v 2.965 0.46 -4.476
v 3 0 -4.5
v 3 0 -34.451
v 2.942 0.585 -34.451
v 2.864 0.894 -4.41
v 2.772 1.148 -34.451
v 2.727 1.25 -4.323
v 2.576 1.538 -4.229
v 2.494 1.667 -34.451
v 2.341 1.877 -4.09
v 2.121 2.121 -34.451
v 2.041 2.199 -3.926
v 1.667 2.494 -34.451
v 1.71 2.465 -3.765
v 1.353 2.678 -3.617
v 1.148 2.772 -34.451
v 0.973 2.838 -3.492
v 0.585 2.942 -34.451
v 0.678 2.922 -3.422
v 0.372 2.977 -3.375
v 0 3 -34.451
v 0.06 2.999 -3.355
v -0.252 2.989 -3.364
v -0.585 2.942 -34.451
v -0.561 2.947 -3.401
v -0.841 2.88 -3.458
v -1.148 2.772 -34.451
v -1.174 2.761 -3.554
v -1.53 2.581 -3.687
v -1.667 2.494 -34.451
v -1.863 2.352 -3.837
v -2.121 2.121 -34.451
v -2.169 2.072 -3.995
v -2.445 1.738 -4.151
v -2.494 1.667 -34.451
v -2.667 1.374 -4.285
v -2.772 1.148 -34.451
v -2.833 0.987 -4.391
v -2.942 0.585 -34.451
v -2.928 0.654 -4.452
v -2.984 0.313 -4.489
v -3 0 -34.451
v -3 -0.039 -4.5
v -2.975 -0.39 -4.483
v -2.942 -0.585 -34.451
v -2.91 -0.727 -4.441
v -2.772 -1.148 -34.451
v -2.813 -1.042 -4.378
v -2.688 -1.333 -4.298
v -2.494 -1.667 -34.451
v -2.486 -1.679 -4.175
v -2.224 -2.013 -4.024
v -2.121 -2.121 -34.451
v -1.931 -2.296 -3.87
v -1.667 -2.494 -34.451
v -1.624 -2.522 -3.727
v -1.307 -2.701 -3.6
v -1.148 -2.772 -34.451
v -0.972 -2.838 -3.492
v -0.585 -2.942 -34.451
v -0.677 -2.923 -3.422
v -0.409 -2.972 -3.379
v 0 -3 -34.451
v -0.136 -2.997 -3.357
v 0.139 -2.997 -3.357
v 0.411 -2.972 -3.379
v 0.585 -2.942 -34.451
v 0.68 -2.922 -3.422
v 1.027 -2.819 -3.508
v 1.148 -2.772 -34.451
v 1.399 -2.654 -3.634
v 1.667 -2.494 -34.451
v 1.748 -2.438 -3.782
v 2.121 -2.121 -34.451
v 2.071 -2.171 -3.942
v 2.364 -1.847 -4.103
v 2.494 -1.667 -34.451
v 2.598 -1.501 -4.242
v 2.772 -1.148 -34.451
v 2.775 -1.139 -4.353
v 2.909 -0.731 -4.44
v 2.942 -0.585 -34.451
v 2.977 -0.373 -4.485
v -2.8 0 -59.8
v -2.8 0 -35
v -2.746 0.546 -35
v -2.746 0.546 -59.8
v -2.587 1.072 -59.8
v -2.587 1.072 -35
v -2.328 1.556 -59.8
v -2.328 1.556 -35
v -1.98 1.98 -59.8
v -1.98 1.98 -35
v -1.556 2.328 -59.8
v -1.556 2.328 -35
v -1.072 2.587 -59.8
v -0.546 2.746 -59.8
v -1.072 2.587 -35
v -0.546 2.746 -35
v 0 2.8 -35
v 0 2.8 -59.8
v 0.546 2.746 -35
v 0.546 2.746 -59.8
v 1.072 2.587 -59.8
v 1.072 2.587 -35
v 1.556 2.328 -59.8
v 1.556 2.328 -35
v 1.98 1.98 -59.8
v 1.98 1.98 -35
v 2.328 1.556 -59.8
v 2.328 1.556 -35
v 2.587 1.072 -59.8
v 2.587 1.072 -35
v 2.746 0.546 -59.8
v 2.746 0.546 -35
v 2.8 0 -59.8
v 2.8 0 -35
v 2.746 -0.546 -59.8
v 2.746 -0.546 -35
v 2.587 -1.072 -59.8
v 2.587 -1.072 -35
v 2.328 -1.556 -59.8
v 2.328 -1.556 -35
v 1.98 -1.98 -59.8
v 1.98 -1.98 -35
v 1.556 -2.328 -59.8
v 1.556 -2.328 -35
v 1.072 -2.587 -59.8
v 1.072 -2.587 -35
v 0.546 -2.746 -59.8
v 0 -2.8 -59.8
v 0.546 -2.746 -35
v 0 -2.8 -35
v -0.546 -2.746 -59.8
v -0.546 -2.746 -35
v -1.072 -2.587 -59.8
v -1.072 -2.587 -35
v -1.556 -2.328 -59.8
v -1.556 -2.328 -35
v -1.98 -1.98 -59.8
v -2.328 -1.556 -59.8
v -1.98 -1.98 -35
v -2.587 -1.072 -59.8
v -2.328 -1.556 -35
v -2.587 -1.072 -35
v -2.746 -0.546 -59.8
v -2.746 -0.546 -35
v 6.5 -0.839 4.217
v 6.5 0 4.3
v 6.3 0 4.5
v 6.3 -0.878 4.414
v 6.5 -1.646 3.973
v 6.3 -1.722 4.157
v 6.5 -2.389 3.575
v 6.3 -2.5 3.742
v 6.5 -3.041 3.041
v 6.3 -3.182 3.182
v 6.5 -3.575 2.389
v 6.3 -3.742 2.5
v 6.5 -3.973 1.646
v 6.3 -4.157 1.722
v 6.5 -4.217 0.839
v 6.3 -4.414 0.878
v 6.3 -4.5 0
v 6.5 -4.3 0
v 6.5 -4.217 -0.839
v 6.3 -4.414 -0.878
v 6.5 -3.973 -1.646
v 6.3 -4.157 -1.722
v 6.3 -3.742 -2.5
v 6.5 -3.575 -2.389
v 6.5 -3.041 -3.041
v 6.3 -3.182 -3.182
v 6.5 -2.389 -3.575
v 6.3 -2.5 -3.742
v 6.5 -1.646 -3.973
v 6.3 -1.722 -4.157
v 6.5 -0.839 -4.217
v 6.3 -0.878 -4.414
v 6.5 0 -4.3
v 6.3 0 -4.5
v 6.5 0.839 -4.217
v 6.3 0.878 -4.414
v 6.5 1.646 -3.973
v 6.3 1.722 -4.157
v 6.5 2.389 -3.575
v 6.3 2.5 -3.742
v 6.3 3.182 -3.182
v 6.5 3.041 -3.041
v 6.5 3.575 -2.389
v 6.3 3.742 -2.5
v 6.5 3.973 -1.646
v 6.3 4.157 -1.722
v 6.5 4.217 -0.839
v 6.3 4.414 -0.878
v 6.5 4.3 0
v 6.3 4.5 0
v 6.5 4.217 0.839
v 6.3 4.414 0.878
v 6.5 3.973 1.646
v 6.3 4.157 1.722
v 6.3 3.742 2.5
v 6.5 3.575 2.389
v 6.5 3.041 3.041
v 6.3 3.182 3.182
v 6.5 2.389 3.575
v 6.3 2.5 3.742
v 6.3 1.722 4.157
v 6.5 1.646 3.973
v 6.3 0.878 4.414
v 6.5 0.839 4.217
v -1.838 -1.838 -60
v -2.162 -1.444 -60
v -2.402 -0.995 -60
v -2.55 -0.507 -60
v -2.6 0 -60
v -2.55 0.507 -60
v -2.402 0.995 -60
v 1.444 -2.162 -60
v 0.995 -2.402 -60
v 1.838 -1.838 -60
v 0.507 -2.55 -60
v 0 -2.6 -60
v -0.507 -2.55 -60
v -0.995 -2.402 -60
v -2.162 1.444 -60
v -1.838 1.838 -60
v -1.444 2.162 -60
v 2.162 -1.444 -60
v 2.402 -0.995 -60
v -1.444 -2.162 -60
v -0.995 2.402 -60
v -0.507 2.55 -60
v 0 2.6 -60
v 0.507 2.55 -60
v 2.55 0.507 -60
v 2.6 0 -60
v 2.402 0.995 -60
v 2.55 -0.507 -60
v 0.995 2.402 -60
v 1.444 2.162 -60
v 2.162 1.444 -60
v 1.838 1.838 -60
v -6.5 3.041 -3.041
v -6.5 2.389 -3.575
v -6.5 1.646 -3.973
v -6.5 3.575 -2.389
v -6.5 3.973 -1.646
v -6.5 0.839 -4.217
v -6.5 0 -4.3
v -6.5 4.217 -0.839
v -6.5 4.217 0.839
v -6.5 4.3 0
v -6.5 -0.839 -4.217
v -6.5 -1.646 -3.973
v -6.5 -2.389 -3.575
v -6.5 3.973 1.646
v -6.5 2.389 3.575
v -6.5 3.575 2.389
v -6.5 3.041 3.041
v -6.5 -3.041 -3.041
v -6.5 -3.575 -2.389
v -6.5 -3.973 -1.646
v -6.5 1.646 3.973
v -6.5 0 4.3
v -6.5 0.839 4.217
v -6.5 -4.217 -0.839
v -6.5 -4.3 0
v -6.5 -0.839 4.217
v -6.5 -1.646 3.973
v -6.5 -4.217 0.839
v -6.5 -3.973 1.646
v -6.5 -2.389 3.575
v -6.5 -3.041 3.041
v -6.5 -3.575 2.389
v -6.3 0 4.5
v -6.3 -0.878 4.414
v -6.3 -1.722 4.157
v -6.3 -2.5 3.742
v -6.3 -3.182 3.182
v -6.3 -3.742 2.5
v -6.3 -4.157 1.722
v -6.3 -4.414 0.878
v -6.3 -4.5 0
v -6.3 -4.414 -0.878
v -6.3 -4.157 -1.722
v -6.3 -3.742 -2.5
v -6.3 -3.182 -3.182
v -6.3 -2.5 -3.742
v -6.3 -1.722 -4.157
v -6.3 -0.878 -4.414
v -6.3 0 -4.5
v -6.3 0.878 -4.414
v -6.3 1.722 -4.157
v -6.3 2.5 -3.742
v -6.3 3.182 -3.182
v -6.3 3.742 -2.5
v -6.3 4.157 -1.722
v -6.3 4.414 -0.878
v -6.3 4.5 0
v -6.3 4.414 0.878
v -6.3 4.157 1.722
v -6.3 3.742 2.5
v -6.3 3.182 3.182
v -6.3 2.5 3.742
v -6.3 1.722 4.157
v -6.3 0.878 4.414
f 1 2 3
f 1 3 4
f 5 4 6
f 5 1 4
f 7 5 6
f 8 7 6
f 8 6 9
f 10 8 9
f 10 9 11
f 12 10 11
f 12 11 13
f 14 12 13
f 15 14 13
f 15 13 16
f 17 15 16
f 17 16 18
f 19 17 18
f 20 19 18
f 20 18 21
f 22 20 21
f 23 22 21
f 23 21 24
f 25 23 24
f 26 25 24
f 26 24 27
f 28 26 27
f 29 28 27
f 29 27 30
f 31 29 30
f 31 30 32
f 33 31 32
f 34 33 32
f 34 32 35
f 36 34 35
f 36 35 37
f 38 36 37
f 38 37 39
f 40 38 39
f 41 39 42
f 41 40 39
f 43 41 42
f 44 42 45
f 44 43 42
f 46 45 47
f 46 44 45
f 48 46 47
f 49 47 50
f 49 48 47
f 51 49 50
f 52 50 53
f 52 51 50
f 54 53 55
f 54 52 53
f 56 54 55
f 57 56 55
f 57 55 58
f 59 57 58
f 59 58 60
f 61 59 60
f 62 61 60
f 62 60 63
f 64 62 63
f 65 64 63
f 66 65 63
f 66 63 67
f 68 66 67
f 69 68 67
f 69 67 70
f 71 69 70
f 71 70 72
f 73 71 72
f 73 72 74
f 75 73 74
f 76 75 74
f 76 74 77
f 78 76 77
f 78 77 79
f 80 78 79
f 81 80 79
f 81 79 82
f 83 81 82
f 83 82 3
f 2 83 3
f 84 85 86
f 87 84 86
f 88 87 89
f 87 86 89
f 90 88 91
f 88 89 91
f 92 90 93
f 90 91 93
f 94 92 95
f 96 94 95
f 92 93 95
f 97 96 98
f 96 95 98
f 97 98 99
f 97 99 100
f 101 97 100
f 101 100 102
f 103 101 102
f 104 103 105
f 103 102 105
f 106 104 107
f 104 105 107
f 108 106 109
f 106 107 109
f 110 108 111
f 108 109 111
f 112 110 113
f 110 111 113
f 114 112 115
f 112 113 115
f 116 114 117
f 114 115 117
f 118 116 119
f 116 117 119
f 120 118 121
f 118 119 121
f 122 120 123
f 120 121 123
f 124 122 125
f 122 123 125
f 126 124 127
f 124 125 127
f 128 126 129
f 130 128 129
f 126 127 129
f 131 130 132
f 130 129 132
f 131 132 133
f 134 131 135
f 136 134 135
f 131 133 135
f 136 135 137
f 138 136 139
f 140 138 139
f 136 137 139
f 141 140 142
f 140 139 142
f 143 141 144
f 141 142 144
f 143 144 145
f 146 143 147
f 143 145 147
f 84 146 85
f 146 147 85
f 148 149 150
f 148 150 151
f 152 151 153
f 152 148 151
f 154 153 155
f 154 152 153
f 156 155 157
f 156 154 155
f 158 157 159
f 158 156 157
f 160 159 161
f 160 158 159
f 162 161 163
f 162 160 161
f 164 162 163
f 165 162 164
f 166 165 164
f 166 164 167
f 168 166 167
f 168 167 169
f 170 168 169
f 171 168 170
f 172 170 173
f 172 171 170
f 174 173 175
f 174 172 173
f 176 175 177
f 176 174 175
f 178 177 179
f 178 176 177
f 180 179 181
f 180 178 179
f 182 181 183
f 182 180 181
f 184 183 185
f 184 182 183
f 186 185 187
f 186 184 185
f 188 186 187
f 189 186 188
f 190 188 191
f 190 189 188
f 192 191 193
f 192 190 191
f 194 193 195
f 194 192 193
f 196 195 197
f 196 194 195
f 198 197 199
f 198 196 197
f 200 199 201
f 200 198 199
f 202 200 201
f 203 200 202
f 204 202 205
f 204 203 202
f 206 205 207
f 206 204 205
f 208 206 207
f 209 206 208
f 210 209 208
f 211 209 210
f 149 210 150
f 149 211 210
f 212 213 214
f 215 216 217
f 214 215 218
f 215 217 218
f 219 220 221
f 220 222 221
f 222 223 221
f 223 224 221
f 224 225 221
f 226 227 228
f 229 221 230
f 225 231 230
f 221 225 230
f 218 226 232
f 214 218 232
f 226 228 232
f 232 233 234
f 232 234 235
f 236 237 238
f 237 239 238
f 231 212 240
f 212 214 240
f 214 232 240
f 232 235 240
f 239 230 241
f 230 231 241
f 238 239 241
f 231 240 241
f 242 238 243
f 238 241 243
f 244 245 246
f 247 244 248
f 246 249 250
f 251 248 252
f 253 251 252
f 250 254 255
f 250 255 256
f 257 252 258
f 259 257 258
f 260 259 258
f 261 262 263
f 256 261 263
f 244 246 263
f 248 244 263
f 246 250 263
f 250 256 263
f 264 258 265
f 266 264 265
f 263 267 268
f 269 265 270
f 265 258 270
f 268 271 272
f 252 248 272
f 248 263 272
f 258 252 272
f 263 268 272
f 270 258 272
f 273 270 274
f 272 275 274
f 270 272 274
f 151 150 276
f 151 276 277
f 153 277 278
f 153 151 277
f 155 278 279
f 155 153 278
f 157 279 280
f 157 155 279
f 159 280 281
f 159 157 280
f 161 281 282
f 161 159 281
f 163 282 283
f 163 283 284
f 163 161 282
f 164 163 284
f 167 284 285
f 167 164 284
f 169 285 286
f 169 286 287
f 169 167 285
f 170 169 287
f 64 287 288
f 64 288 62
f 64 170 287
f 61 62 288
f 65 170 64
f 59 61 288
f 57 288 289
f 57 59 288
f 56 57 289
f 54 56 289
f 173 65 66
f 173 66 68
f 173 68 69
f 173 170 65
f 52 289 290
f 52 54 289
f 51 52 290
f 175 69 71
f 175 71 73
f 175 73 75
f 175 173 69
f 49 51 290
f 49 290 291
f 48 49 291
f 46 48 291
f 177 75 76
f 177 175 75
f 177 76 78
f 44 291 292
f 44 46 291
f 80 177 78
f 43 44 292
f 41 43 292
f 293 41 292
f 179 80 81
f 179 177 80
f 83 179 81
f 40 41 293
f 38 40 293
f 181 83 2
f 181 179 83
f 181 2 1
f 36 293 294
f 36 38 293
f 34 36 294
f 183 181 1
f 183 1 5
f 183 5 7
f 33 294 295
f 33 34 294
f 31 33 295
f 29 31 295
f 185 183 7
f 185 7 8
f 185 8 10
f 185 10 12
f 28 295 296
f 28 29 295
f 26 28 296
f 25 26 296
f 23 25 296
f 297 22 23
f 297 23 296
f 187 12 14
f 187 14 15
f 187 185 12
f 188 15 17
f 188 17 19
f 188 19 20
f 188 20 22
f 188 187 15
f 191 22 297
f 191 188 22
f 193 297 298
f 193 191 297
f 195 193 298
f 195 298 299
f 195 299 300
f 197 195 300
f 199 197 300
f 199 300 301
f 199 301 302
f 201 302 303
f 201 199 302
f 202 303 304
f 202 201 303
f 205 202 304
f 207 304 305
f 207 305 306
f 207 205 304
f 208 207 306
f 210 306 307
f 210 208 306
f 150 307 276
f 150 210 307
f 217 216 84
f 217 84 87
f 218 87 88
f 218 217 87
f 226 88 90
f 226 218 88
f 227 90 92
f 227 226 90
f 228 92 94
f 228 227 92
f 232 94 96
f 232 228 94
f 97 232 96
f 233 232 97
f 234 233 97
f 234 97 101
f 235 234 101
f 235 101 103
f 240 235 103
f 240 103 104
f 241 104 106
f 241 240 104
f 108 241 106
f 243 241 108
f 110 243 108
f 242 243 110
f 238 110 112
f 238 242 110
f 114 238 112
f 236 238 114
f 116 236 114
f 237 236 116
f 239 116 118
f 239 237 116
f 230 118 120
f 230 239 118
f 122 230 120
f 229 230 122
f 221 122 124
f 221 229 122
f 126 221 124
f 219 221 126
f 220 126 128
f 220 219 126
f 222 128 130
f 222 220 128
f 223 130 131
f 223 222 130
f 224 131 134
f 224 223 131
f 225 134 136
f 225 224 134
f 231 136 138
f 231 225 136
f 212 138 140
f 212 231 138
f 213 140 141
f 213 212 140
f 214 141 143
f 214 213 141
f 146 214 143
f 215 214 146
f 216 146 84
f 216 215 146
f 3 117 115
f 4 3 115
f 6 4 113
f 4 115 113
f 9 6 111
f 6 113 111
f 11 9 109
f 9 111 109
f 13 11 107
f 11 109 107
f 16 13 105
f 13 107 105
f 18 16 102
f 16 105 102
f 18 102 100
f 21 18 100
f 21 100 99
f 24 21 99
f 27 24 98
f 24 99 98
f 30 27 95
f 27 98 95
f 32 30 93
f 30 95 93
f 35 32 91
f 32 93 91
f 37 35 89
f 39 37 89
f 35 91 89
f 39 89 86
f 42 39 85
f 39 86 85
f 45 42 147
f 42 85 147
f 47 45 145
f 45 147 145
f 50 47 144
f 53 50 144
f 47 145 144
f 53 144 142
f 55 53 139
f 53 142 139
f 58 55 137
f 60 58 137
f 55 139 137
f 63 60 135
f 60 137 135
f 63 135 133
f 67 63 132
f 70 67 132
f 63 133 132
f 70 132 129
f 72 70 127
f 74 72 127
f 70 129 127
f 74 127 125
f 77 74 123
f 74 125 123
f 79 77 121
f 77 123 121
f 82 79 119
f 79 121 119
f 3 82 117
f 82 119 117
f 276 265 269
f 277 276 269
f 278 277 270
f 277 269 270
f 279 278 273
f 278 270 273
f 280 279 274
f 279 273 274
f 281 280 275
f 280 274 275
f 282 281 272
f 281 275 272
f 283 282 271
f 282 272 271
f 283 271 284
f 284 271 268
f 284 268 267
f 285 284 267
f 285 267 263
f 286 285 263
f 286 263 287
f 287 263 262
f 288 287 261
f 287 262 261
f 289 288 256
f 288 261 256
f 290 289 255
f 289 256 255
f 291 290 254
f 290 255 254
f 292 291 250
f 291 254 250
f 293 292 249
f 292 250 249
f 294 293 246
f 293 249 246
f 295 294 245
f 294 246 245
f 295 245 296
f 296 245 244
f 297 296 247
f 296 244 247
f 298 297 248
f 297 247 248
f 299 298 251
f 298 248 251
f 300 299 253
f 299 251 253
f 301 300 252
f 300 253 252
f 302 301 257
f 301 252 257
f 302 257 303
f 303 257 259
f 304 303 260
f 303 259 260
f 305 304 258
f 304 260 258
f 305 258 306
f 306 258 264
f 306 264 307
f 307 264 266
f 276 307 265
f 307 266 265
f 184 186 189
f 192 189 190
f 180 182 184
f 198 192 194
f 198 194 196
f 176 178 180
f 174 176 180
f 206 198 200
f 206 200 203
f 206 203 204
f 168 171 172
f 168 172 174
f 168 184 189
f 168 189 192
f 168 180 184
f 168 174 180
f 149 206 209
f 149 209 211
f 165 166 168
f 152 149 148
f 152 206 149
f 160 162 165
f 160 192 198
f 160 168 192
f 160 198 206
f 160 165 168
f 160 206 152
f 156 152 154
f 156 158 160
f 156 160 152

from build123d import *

# Parameters (mm, degrees)
SKETCH1_R               = 4.5
BOSS_EXTRUDE1_DEPTH     = 6.5
SKETCH2_R               = 3
BOSS_EXTRUDE2_DEPTH     = 60
CUT_EXTRUDE_THIN1_START = -25
SKETCH3_R               = 3
SKETCH3_R_2             = 2.8
CUT_EXTRUDE_THIN1_DEPTH = 25
CHAMFER1_SIZE2          = 0.2
CHAMFER1_SIZE           = 0.549495484
CHAMFER2_SIZE           = 0.2
CHAMFER3_SIZE           = 0.2


with BuildPart() as part:
    # Sketch1 → Boss-Extrude1 (new, symmetric)
    with BuildSketch(Plane(origin=(0, 0, 0), x_dir=(0, 0, -1), z_dir=(1, 0, 0))):
        with Locations(Location((0, 0, 0), (0, 0, 180))):
            Circle(SKETCH1_R)
    extrude(amount=BOSS_EXTRUDE1_DEPTH, both=True)

    # Sketch2 → Boss-Extrude2 (add)
    with BuildSketch(Plane.XY):
        Circle(SKETCH2_R)
    extrude(amount=-BOSS_EXTRUDE2_DEPTH)

    # Sketch3 → Cut-Extrude-Thin1 (cut)
    with BuildSketch(Plane(origin=(0, 0, -60), x_dir=(-1, 0, 0), z_dir=(0, 0, -1)).offset(CUT_EXTRUDE_THIN1_START)):
        Circle(SKETCH3_R)
        Circle(SKETCH3_R_2, mode=Mode.SUBTRACT)
    extrude(amount=CUT_EXTRUDE_THIN1_DEPTH, mode=Mode.SUBTRACT)

    # Chamfer1
    chamfer1_edges = [part.edges().sort_by_distance(p)[0] for p in [
        (-3, 0, -35),
    ]]
    chamfer1_side = [part.faces().sort_by_distance(p)[0] for p in [
        (-3, 0, -34.996),
    ]]
    chamfer(chamfer1_edges, length=CHAMFER1_SIZE - 0.0001, length2=CHAMFER1_SIZE2 - 0.0001, reference=chamfer1_side[0])  # a hair under: the kernel refuses the full size

    # Chamfer2
    chamfer2_edges = [part.edges().sort_by_distance(p)[0] for p in [
        (-6.5, 0, -4.5),
        (6.5, 0, -4.5),
    ]]
    chamfer(chamfer2_edges, length=CHAMFER2_SIZE)

    # Chamfer3
    chamfer3_edges = [part.edges().sort_by_distance(p)[0] for p in [
        (2.8, 0, -60),
    ]]
    chamfer(chamfer3_edges, length=CHAMFER3_SIZE)


solid = part.part
